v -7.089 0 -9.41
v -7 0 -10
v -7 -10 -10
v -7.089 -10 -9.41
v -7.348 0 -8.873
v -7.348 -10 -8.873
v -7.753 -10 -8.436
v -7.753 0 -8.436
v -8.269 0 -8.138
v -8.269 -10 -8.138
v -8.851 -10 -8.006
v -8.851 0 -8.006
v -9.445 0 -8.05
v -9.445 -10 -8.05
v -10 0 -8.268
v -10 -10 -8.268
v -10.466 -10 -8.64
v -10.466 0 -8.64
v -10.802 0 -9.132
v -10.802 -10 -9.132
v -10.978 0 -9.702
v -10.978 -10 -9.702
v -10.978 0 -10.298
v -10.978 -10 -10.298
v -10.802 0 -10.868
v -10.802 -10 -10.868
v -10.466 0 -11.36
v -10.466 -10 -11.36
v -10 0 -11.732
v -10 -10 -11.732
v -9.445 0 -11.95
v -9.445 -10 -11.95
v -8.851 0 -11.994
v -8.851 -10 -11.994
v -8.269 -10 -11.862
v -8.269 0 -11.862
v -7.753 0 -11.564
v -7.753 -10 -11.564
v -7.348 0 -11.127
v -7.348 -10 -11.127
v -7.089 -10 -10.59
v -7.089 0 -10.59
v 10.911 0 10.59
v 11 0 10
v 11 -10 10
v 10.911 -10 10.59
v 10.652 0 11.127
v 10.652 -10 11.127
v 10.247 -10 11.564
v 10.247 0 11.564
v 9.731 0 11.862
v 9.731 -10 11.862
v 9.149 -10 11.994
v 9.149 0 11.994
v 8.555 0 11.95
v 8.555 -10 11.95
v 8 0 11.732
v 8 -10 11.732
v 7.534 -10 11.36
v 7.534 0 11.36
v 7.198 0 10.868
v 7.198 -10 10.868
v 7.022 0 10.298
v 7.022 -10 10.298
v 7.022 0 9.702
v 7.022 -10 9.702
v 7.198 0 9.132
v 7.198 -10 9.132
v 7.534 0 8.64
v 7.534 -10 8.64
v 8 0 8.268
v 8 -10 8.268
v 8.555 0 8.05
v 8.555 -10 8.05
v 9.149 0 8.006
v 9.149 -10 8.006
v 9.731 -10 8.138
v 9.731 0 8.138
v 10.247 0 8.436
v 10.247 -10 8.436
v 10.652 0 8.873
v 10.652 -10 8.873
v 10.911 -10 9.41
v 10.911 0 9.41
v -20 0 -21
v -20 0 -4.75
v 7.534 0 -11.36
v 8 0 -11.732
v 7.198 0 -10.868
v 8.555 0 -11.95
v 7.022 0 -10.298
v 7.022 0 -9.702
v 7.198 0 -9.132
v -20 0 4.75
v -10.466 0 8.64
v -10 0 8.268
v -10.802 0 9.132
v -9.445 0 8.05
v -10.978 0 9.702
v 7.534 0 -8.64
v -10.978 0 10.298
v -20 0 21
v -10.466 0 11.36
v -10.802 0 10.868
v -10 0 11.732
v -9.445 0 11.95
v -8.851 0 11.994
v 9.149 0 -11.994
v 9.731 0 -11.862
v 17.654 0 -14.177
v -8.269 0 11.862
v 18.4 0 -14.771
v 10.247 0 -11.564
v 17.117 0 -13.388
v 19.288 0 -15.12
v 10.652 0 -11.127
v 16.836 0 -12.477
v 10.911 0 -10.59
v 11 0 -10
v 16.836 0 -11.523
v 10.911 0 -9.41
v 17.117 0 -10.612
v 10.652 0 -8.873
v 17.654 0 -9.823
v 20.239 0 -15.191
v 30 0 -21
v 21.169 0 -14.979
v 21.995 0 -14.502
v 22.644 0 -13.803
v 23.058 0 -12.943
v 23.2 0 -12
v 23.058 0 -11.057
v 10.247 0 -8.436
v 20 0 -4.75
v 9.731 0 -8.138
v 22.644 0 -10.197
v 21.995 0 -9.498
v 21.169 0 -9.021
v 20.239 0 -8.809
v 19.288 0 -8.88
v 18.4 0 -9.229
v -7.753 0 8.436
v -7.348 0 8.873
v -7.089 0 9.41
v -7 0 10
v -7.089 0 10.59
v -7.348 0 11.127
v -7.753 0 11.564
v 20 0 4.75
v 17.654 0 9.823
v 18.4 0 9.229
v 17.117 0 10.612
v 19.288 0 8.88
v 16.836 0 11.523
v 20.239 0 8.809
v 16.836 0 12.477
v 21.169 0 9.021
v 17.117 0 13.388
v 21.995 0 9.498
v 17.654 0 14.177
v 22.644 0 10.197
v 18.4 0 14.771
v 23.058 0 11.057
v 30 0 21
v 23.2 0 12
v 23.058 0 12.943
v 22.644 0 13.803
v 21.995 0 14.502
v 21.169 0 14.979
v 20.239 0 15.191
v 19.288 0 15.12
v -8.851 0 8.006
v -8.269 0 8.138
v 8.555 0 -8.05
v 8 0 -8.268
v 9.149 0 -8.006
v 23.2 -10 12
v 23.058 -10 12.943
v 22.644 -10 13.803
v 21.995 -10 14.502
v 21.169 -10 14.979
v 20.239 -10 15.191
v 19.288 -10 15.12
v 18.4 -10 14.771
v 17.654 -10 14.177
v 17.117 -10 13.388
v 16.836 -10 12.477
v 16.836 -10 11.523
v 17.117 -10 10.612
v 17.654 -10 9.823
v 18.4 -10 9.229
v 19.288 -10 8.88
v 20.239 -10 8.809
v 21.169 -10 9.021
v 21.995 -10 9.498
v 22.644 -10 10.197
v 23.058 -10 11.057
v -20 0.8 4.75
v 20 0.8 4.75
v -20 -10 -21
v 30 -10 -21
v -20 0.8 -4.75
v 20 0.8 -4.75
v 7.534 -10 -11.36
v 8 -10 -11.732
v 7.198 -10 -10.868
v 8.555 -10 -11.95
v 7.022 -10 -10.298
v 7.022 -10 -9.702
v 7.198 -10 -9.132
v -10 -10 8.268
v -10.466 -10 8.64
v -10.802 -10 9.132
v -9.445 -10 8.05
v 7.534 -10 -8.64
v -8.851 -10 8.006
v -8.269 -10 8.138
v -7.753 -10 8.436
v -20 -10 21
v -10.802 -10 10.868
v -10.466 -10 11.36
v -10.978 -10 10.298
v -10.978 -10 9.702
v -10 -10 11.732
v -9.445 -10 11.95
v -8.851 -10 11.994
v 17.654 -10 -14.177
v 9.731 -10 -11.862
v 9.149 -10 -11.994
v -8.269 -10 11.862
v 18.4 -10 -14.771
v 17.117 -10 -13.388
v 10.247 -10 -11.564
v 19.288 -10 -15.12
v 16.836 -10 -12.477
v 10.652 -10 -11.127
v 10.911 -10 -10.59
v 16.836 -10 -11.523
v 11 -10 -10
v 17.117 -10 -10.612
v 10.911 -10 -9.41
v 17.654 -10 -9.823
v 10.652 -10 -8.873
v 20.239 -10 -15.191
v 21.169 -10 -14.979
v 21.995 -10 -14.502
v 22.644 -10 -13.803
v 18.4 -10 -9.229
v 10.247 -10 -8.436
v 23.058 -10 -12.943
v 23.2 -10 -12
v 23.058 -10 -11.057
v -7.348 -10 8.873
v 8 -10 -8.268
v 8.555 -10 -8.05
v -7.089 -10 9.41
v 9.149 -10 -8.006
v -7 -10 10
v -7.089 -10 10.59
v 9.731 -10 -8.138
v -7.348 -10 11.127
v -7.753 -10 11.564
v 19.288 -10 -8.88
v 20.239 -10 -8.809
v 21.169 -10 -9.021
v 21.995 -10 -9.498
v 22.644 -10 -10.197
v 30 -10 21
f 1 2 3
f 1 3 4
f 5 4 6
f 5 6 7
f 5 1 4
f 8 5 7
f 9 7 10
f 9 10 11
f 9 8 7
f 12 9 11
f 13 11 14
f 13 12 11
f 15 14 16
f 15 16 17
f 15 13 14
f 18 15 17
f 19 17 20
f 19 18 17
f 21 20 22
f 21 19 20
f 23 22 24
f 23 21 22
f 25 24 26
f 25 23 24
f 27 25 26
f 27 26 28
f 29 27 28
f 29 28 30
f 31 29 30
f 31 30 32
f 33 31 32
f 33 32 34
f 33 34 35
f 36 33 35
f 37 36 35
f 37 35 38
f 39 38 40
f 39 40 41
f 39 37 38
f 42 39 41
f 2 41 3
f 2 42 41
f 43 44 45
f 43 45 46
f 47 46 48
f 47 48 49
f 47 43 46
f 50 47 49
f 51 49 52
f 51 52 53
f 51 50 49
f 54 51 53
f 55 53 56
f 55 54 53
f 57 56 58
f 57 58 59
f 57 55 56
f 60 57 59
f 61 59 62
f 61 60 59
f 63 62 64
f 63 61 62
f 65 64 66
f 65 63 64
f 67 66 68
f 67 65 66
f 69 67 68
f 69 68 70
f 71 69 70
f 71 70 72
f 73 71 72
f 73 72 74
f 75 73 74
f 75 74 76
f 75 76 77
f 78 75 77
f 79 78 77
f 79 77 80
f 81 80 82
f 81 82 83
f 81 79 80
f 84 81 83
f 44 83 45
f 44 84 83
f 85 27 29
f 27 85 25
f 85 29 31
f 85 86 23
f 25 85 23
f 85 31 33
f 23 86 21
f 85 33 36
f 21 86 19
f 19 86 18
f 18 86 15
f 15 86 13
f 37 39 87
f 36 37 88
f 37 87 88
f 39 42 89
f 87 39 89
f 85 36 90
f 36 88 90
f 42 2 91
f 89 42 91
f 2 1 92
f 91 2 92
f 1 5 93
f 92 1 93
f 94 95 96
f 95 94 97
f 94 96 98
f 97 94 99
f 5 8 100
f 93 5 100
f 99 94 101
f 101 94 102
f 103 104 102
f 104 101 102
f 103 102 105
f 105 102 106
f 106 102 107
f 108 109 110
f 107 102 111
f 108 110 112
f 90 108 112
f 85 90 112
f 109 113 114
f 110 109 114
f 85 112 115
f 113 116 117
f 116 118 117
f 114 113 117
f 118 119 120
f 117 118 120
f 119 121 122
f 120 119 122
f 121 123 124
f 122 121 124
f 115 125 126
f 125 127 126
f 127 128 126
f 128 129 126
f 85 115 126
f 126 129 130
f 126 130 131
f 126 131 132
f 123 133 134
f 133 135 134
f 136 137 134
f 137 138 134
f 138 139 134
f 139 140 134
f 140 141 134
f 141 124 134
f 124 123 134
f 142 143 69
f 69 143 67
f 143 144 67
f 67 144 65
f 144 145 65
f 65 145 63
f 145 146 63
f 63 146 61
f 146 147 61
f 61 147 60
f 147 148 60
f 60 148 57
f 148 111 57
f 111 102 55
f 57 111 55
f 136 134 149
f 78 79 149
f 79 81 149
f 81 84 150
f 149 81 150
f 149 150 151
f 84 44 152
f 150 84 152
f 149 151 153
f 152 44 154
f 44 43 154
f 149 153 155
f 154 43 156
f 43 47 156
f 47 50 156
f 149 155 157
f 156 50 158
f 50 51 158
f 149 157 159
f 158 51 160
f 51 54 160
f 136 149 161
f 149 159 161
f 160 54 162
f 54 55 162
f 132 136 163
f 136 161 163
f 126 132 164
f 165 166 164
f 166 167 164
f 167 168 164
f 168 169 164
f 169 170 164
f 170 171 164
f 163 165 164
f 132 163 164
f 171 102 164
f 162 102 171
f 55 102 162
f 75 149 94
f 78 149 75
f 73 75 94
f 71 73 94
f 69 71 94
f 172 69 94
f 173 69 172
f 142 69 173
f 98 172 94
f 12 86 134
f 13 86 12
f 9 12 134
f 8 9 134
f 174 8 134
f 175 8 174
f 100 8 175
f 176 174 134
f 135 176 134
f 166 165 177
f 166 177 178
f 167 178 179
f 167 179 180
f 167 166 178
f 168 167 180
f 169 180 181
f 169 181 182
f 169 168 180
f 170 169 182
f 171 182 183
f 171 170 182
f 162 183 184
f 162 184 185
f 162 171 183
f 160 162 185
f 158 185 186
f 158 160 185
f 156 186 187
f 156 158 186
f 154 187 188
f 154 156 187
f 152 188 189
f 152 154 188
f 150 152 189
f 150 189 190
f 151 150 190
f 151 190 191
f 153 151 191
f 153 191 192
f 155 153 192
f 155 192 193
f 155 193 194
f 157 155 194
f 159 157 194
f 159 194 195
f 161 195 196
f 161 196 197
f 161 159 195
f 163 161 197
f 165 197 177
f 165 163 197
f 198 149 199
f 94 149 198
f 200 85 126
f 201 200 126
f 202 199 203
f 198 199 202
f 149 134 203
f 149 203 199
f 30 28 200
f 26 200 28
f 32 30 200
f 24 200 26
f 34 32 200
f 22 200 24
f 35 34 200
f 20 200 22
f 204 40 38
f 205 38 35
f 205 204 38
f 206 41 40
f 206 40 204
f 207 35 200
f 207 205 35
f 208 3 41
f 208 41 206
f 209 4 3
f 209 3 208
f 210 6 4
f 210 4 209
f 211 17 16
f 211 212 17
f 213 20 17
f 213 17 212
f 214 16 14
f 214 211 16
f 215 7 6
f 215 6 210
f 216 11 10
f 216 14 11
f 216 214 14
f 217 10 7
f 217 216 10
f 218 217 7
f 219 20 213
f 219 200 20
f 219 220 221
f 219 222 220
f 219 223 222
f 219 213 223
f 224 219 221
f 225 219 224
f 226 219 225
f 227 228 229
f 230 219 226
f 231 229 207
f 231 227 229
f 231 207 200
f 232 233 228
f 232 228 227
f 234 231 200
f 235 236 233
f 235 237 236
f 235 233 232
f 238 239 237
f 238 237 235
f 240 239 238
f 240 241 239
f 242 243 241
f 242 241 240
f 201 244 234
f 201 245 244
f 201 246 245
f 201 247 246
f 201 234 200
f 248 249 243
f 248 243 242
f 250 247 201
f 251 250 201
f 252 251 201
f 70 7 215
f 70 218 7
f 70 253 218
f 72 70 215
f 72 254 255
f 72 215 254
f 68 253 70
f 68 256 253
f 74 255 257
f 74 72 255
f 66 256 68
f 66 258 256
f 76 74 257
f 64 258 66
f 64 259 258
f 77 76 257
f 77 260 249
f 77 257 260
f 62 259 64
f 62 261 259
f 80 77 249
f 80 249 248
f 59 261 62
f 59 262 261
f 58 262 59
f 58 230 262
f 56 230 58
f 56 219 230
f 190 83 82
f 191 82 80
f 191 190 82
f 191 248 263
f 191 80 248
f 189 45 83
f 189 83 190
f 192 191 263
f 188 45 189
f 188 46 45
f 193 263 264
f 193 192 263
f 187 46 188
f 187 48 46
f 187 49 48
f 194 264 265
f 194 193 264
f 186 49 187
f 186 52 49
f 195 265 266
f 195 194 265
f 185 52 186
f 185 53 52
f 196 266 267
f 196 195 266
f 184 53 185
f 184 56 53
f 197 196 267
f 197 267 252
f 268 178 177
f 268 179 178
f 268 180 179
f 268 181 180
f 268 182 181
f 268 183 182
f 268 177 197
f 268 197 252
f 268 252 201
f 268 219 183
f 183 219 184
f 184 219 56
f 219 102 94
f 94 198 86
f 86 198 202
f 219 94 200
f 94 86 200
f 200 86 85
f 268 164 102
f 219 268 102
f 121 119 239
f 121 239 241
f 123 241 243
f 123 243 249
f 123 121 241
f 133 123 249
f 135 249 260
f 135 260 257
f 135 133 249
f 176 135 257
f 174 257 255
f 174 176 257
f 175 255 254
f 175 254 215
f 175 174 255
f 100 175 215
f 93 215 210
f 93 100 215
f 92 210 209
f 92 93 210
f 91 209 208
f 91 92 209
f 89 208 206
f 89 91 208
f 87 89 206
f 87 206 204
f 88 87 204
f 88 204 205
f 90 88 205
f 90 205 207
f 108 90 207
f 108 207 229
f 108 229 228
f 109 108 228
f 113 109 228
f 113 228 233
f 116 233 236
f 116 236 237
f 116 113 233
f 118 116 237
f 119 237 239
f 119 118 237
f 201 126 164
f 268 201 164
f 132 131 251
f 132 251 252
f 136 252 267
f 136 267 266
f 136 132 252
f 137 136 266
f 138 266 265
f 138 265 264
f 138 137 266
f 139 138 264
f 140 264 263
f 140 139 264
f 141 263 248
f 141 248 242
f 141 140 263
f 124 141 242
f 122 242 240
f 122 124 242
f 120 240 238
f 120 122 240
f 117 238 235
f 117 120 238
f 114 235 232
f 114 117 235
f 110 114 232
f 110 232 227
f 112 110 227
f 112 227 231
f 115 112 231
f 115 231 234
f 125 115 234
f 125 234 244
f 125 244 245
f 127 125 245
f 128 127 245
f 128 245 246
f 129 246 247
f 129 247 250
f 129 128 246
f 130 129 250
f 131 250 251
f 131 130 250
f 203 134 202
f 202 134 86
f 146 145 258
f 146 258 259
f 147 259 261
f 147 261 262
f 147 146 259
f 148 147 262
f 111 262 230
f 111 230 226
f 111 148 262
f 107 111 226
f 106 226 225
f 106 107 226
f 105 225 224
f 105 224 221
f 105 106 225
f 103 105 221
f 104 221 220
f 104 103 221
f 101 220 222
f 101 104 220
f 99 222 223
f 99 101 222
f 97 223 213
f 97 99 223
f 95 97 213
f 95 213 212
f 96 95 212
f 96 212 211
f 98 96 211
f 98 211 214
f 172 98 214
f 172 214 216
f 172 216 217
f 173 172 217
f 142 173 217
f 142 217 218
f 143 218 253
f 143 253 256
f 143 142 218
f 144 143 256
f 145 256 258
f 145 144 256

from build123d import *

# Parameters (mm, degrees)
F0_R     = 3.2
F2_DEPTH = 10
F1_R     = 2
F3_DEPTH = 10
F4_W     = 40
F4_H     = 9.5
F5_DEPTH = 0.8


with BuildPart() as f2:
    # F0 (on Front) → F2 (new body)
    with BuildSketch(Plane.XZ):
        Polygon((-20, -21), (20, -21), (30, -21), (30, 21), (20, 21), (-20, 21), align=None)
        with Locations((20, -12)):
            Circle(F0_R, mode=Mode.SUBTRACT)
        with Locations((20, 12)):
            Circle(F0_R, mode=Mode.SUBTRACT)
    extrude(amount=F2_DEPTH)

    # F1 (on Front) → F3 (cut, through all)
    with BuildSketch(Plane.XZ):
        with Locations((-9, 10)):
            Circle(F1_R)
        with Locations((-9, -10)):
            Circle(F1_R)
        with Locations((9, 10)):
            Circle(F1_R)
        with Locations((9, -10)):
            Circle(F1_R)
    extrude(amount=F3_DEPTH, mode=Mode.SUBTRACT)

    # F4 (on face) → F5 (join)
    with BuildSketch(Plane(origin=(0, 0, 0), x_dir=(-1, 0, 0), z_dir=(0, 1, 0))):
        Rectangle(F4_W, F4_H)
    extrude(amount=F5_DEPTH)


solid = f2.part
